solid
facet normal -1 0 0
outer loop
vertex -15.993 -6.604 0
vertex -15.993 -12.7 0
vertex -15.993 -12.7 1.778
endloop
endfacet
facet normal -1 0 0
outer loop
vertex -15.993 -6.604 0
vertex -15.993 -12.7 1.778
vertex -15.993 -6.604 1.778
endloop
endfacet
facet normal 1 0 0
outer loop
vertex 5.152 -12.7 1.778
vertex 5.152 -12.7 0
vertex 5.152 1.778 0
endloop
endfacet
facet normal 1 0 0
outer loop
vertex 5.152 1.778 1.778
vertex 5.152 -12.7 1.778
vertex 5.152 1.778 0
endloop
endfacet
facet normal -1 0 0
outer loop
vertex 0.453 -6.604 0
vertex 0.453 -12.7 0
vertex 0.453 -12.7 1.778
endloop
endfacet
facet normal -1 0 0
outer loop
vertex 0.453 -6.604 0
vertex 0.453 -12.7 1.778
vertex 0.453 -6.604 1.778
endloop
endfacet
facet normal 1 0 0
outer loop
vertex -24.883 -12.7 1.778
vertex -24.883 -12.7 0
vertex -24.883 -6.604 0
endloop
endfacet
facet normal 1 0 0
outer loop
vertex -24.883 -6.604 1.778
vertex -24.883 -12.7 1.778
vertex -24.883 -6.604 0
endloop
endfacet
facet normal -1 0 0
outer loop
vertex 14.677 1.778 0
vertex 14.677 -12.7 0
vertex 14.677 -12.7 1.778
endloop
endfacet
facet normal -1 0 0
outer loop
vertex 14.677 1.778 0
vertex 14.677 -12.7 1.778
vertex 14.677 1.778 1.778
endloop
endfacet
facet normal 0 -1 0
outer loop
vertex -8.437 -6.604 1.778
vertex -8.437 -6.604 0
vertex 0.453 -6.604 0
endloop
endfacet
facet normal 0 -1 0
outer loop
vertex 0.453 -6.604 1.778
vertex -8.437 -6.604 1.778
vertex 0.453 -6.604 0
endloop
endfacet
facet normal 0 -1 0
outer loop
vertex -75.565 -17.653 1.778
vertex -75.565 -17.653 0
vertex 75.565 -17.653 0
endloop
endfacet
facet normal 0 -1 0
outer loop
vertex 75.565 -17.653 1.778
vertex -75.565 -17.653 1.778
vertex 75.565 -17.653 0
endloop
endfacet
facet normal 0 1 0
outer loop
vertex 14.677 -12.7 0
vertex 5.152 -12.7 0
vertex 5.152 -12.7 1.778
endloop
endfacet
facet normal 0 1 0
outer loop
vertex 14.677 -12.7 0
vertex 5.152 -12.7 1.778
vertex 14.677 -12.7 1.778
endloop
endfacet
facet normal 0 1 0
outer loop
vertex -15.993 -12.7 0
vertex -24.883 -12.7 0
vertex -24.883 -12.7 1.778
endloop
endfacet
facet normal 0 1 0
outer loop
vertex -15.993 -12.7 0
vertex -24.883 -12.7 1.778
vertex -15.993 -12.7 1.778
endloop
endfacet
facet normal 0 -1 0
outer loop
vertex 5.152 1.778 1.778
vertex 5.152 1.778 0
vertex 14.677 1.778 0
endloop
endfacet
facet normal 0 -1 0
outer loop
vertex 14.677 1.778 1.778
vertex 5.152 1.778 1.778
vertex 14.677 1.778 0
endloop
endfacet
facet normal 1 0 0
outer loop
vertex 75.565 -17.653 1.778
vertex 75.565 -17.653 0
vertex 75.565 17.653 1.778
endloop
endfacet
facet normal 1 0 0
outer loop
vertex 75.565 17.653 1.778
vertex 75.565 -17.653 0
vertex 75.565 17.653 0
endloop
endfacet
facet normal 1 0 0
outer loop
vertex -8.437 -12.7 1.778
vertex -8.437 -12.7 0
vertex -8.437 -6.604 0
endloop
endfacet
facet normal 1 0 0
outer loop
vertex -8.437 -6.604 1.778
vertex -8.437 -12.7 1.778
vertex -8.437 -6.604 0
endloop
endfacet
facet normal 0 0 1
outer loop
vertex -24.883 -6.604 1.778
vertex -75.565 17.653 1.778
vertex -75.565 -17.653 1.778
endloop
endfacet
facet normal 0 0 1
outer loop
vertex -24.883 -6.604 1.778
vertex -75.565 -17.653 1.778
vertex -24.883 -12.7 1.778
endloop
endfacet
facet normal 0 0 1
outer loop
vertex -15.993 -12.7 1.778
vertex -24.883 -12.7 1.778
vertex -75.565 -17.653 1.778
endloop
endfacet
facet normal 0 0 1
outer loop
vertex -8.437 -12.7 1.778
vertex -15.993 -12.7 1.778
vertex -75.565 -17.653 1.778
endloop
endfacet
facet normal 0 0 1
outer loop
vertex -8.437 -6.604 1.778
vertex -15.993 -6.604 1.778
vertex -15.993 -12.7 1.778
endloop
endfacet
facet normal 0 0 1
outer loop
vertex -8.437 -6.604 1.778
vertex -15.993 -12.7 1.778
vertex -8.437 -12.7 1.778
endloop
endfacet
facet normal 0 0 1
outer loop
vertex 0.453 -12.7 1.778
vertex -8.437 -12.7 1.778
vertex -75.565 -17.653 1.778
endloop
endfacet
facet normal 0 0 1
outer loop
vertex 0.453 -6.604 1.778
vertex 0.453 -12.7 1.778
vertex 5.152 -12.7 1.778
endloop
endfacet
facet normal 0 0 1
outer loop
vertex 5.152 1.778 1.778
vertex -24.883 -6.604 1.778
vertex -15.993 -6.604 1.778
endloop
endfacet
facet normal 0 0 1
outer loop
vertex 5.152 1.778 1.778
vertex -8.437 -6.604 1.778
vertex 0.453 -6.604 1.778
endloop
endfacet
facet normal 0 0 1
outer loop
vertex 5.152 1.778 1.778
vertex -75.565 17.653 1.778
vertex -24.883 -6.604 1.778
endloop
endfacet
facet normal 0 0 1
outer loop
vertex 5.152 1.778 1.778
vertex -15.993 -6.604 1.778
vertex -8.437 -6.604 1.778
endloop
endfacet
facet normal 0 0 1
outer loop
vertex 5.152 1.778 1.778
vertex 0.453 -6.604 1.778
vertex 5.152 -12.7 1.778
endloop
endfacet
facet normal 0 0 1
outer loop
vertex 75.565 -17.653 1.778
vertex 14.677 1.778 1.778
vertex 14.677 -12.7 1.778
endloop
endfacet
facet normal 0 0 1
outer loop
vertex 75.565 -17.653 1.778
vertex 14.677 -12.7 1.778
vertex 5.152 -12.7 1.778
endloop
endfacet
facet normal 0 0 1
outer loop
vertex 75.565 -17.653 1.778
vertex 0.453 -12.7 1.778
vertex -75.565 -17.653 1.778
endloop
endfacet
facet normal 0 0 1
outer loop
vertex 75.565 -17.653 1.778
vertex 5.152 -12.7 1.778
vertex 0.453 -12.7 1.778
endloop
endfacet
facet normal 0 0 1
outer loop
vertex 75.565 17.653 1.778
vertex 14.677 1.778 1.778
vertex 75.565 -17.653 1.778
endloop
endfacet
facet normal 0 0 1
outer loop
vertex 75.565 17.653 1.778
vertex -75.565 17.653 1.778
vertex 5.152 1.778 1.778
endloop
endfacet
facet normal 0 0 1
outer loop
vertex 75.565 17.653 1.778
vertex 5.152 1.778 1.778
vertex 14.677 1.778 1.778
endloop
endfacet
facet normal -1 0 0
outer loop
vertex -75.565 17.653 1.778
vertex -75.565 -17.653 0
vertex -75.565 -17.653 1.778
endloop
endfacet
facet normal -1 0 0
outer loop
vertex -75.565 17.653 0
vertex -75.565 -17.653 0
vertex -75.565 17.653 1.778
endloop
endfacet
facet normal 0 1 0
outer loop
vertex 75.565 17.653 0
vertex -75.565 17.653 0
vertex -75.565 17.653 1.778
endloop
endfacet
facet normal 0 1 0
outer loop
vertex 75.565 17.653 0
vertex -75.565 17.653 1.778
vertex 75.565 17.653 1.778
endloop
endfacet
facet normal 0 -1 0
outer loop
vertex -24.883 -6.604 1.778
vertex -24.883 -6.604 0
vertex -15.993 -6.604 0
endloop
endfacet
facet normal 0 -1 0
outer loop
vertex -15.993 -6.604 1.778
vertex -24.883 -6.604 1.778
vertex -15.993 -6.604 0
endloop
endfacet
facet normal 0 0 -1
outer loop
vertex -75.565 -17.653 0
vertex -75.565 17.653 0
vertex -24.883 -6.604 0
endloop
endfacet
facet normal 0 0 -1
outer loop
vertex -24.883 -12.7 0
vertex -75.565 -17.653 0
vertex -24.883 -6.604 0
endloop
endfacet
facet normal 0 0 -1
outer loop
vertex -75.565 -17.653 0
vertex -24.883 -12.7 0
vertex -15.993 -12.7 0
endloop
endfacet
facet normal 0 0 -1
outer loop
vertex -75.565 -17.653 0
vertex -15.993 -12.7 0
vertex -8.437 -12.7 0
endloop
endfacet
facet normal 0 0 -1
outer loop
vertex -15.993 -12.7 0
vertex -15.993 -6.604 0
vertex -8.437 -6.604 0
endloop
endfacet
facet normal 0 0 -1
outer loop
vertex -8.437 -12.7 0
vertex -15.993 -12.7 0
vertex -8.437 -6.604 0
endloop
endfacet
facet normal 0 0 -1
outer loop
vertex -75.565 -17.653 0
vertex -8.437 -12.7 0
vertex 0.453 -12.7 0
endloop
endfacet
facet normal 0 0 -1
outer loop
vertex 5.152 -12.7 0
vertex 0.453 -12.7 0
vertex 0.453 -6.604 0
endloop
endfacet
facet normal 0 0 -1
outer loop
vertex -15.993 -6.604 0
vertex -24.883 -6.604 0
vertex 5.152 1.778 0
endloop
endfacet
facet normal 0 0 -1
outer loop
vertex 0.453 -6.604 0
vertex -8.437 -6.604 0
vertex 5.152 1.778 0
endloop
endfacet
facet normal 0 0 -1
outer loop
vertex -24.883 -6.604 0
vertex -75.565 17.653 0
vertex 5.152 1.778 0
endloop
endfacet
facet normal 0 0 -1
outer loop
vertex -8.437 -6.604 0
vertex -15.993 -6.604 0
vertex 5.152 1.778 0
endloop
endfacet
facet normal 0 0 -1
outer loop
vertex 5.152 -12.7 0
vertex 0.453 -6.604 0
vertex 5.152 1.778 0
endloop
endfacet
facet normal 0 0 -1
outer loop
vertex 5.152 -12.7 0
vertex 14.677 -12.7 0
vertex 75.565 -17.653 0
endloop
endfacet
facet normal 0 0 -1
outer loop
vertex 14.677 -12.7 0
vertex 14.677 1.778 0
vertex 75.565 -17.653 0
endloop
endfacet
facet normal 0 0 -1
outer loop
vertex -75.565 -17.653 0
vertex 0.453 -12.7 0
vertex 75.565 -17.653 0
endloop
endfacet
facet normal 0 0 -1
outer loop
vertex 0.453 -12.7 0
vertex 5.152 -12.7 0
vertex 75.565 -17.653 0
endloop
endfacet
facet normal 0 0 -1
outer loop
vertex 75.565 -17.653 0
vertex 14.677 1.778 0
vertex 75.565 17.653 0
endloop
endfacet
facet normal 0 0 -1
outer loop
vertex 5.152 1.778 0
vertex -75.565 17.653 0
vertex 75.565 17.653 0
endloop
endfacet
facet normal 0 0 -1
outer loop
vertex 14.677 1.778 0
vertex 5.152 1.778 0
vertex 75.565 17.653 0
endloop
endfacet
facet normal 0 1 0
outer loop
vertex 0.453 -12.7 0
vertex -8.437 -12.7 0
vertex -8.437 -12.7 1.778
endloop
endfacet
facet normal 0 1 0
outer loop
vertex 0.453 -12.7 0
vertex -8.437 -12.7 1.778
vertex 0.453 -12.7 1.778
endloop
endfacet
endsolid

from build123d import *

# Parameters (mm, degrees)
F0_W     = 151.13
F0_H     = 35.306
F1_DEPTH = 1.778
F2_W     = 151.13
F2_H     = 35.306
F4_DEPTH = 1.778
F3_W     = 8.89
F3_H     = 6.096
F3_W_2   = 9.525
F3_H_2   = 14.478
F5_DEPTH = 2.54


with BuildPart() as f1:
    # F0 (on Top) → F1 (new body)
    with BuildSketch(Plane.XY):
        with Locations((-0.822666, -120.916817)):
            Rectangle(F0_W, F0_H)
    extrude(amount=F1_DEPTH)


with BuildPart() as f4:
    # F2 (on Top) → F4 (new body)
    with BuildSketch(Plane.XY):
        Rectangle(F2_W, F2_H)
    extrude(amount=F4_DEPTH)

    # F3 (on face) → F5 (cut)
    with BuildSketch(Plane.XY):
        with Locations((-3.99227, -9.652)):
            Rectangle(F3_W, F3_H)
        with Locations((-20.438026, -9.652)):
            Rectangle(F3_W, F3_H)
        with Locations((9.91423, -5.461)):
            Rectangle(F3_W_2, F3_H_2)
    extrude(amount=F5_DEPTH, mode=Mode.SUBTRACT)


solid = f4.part
